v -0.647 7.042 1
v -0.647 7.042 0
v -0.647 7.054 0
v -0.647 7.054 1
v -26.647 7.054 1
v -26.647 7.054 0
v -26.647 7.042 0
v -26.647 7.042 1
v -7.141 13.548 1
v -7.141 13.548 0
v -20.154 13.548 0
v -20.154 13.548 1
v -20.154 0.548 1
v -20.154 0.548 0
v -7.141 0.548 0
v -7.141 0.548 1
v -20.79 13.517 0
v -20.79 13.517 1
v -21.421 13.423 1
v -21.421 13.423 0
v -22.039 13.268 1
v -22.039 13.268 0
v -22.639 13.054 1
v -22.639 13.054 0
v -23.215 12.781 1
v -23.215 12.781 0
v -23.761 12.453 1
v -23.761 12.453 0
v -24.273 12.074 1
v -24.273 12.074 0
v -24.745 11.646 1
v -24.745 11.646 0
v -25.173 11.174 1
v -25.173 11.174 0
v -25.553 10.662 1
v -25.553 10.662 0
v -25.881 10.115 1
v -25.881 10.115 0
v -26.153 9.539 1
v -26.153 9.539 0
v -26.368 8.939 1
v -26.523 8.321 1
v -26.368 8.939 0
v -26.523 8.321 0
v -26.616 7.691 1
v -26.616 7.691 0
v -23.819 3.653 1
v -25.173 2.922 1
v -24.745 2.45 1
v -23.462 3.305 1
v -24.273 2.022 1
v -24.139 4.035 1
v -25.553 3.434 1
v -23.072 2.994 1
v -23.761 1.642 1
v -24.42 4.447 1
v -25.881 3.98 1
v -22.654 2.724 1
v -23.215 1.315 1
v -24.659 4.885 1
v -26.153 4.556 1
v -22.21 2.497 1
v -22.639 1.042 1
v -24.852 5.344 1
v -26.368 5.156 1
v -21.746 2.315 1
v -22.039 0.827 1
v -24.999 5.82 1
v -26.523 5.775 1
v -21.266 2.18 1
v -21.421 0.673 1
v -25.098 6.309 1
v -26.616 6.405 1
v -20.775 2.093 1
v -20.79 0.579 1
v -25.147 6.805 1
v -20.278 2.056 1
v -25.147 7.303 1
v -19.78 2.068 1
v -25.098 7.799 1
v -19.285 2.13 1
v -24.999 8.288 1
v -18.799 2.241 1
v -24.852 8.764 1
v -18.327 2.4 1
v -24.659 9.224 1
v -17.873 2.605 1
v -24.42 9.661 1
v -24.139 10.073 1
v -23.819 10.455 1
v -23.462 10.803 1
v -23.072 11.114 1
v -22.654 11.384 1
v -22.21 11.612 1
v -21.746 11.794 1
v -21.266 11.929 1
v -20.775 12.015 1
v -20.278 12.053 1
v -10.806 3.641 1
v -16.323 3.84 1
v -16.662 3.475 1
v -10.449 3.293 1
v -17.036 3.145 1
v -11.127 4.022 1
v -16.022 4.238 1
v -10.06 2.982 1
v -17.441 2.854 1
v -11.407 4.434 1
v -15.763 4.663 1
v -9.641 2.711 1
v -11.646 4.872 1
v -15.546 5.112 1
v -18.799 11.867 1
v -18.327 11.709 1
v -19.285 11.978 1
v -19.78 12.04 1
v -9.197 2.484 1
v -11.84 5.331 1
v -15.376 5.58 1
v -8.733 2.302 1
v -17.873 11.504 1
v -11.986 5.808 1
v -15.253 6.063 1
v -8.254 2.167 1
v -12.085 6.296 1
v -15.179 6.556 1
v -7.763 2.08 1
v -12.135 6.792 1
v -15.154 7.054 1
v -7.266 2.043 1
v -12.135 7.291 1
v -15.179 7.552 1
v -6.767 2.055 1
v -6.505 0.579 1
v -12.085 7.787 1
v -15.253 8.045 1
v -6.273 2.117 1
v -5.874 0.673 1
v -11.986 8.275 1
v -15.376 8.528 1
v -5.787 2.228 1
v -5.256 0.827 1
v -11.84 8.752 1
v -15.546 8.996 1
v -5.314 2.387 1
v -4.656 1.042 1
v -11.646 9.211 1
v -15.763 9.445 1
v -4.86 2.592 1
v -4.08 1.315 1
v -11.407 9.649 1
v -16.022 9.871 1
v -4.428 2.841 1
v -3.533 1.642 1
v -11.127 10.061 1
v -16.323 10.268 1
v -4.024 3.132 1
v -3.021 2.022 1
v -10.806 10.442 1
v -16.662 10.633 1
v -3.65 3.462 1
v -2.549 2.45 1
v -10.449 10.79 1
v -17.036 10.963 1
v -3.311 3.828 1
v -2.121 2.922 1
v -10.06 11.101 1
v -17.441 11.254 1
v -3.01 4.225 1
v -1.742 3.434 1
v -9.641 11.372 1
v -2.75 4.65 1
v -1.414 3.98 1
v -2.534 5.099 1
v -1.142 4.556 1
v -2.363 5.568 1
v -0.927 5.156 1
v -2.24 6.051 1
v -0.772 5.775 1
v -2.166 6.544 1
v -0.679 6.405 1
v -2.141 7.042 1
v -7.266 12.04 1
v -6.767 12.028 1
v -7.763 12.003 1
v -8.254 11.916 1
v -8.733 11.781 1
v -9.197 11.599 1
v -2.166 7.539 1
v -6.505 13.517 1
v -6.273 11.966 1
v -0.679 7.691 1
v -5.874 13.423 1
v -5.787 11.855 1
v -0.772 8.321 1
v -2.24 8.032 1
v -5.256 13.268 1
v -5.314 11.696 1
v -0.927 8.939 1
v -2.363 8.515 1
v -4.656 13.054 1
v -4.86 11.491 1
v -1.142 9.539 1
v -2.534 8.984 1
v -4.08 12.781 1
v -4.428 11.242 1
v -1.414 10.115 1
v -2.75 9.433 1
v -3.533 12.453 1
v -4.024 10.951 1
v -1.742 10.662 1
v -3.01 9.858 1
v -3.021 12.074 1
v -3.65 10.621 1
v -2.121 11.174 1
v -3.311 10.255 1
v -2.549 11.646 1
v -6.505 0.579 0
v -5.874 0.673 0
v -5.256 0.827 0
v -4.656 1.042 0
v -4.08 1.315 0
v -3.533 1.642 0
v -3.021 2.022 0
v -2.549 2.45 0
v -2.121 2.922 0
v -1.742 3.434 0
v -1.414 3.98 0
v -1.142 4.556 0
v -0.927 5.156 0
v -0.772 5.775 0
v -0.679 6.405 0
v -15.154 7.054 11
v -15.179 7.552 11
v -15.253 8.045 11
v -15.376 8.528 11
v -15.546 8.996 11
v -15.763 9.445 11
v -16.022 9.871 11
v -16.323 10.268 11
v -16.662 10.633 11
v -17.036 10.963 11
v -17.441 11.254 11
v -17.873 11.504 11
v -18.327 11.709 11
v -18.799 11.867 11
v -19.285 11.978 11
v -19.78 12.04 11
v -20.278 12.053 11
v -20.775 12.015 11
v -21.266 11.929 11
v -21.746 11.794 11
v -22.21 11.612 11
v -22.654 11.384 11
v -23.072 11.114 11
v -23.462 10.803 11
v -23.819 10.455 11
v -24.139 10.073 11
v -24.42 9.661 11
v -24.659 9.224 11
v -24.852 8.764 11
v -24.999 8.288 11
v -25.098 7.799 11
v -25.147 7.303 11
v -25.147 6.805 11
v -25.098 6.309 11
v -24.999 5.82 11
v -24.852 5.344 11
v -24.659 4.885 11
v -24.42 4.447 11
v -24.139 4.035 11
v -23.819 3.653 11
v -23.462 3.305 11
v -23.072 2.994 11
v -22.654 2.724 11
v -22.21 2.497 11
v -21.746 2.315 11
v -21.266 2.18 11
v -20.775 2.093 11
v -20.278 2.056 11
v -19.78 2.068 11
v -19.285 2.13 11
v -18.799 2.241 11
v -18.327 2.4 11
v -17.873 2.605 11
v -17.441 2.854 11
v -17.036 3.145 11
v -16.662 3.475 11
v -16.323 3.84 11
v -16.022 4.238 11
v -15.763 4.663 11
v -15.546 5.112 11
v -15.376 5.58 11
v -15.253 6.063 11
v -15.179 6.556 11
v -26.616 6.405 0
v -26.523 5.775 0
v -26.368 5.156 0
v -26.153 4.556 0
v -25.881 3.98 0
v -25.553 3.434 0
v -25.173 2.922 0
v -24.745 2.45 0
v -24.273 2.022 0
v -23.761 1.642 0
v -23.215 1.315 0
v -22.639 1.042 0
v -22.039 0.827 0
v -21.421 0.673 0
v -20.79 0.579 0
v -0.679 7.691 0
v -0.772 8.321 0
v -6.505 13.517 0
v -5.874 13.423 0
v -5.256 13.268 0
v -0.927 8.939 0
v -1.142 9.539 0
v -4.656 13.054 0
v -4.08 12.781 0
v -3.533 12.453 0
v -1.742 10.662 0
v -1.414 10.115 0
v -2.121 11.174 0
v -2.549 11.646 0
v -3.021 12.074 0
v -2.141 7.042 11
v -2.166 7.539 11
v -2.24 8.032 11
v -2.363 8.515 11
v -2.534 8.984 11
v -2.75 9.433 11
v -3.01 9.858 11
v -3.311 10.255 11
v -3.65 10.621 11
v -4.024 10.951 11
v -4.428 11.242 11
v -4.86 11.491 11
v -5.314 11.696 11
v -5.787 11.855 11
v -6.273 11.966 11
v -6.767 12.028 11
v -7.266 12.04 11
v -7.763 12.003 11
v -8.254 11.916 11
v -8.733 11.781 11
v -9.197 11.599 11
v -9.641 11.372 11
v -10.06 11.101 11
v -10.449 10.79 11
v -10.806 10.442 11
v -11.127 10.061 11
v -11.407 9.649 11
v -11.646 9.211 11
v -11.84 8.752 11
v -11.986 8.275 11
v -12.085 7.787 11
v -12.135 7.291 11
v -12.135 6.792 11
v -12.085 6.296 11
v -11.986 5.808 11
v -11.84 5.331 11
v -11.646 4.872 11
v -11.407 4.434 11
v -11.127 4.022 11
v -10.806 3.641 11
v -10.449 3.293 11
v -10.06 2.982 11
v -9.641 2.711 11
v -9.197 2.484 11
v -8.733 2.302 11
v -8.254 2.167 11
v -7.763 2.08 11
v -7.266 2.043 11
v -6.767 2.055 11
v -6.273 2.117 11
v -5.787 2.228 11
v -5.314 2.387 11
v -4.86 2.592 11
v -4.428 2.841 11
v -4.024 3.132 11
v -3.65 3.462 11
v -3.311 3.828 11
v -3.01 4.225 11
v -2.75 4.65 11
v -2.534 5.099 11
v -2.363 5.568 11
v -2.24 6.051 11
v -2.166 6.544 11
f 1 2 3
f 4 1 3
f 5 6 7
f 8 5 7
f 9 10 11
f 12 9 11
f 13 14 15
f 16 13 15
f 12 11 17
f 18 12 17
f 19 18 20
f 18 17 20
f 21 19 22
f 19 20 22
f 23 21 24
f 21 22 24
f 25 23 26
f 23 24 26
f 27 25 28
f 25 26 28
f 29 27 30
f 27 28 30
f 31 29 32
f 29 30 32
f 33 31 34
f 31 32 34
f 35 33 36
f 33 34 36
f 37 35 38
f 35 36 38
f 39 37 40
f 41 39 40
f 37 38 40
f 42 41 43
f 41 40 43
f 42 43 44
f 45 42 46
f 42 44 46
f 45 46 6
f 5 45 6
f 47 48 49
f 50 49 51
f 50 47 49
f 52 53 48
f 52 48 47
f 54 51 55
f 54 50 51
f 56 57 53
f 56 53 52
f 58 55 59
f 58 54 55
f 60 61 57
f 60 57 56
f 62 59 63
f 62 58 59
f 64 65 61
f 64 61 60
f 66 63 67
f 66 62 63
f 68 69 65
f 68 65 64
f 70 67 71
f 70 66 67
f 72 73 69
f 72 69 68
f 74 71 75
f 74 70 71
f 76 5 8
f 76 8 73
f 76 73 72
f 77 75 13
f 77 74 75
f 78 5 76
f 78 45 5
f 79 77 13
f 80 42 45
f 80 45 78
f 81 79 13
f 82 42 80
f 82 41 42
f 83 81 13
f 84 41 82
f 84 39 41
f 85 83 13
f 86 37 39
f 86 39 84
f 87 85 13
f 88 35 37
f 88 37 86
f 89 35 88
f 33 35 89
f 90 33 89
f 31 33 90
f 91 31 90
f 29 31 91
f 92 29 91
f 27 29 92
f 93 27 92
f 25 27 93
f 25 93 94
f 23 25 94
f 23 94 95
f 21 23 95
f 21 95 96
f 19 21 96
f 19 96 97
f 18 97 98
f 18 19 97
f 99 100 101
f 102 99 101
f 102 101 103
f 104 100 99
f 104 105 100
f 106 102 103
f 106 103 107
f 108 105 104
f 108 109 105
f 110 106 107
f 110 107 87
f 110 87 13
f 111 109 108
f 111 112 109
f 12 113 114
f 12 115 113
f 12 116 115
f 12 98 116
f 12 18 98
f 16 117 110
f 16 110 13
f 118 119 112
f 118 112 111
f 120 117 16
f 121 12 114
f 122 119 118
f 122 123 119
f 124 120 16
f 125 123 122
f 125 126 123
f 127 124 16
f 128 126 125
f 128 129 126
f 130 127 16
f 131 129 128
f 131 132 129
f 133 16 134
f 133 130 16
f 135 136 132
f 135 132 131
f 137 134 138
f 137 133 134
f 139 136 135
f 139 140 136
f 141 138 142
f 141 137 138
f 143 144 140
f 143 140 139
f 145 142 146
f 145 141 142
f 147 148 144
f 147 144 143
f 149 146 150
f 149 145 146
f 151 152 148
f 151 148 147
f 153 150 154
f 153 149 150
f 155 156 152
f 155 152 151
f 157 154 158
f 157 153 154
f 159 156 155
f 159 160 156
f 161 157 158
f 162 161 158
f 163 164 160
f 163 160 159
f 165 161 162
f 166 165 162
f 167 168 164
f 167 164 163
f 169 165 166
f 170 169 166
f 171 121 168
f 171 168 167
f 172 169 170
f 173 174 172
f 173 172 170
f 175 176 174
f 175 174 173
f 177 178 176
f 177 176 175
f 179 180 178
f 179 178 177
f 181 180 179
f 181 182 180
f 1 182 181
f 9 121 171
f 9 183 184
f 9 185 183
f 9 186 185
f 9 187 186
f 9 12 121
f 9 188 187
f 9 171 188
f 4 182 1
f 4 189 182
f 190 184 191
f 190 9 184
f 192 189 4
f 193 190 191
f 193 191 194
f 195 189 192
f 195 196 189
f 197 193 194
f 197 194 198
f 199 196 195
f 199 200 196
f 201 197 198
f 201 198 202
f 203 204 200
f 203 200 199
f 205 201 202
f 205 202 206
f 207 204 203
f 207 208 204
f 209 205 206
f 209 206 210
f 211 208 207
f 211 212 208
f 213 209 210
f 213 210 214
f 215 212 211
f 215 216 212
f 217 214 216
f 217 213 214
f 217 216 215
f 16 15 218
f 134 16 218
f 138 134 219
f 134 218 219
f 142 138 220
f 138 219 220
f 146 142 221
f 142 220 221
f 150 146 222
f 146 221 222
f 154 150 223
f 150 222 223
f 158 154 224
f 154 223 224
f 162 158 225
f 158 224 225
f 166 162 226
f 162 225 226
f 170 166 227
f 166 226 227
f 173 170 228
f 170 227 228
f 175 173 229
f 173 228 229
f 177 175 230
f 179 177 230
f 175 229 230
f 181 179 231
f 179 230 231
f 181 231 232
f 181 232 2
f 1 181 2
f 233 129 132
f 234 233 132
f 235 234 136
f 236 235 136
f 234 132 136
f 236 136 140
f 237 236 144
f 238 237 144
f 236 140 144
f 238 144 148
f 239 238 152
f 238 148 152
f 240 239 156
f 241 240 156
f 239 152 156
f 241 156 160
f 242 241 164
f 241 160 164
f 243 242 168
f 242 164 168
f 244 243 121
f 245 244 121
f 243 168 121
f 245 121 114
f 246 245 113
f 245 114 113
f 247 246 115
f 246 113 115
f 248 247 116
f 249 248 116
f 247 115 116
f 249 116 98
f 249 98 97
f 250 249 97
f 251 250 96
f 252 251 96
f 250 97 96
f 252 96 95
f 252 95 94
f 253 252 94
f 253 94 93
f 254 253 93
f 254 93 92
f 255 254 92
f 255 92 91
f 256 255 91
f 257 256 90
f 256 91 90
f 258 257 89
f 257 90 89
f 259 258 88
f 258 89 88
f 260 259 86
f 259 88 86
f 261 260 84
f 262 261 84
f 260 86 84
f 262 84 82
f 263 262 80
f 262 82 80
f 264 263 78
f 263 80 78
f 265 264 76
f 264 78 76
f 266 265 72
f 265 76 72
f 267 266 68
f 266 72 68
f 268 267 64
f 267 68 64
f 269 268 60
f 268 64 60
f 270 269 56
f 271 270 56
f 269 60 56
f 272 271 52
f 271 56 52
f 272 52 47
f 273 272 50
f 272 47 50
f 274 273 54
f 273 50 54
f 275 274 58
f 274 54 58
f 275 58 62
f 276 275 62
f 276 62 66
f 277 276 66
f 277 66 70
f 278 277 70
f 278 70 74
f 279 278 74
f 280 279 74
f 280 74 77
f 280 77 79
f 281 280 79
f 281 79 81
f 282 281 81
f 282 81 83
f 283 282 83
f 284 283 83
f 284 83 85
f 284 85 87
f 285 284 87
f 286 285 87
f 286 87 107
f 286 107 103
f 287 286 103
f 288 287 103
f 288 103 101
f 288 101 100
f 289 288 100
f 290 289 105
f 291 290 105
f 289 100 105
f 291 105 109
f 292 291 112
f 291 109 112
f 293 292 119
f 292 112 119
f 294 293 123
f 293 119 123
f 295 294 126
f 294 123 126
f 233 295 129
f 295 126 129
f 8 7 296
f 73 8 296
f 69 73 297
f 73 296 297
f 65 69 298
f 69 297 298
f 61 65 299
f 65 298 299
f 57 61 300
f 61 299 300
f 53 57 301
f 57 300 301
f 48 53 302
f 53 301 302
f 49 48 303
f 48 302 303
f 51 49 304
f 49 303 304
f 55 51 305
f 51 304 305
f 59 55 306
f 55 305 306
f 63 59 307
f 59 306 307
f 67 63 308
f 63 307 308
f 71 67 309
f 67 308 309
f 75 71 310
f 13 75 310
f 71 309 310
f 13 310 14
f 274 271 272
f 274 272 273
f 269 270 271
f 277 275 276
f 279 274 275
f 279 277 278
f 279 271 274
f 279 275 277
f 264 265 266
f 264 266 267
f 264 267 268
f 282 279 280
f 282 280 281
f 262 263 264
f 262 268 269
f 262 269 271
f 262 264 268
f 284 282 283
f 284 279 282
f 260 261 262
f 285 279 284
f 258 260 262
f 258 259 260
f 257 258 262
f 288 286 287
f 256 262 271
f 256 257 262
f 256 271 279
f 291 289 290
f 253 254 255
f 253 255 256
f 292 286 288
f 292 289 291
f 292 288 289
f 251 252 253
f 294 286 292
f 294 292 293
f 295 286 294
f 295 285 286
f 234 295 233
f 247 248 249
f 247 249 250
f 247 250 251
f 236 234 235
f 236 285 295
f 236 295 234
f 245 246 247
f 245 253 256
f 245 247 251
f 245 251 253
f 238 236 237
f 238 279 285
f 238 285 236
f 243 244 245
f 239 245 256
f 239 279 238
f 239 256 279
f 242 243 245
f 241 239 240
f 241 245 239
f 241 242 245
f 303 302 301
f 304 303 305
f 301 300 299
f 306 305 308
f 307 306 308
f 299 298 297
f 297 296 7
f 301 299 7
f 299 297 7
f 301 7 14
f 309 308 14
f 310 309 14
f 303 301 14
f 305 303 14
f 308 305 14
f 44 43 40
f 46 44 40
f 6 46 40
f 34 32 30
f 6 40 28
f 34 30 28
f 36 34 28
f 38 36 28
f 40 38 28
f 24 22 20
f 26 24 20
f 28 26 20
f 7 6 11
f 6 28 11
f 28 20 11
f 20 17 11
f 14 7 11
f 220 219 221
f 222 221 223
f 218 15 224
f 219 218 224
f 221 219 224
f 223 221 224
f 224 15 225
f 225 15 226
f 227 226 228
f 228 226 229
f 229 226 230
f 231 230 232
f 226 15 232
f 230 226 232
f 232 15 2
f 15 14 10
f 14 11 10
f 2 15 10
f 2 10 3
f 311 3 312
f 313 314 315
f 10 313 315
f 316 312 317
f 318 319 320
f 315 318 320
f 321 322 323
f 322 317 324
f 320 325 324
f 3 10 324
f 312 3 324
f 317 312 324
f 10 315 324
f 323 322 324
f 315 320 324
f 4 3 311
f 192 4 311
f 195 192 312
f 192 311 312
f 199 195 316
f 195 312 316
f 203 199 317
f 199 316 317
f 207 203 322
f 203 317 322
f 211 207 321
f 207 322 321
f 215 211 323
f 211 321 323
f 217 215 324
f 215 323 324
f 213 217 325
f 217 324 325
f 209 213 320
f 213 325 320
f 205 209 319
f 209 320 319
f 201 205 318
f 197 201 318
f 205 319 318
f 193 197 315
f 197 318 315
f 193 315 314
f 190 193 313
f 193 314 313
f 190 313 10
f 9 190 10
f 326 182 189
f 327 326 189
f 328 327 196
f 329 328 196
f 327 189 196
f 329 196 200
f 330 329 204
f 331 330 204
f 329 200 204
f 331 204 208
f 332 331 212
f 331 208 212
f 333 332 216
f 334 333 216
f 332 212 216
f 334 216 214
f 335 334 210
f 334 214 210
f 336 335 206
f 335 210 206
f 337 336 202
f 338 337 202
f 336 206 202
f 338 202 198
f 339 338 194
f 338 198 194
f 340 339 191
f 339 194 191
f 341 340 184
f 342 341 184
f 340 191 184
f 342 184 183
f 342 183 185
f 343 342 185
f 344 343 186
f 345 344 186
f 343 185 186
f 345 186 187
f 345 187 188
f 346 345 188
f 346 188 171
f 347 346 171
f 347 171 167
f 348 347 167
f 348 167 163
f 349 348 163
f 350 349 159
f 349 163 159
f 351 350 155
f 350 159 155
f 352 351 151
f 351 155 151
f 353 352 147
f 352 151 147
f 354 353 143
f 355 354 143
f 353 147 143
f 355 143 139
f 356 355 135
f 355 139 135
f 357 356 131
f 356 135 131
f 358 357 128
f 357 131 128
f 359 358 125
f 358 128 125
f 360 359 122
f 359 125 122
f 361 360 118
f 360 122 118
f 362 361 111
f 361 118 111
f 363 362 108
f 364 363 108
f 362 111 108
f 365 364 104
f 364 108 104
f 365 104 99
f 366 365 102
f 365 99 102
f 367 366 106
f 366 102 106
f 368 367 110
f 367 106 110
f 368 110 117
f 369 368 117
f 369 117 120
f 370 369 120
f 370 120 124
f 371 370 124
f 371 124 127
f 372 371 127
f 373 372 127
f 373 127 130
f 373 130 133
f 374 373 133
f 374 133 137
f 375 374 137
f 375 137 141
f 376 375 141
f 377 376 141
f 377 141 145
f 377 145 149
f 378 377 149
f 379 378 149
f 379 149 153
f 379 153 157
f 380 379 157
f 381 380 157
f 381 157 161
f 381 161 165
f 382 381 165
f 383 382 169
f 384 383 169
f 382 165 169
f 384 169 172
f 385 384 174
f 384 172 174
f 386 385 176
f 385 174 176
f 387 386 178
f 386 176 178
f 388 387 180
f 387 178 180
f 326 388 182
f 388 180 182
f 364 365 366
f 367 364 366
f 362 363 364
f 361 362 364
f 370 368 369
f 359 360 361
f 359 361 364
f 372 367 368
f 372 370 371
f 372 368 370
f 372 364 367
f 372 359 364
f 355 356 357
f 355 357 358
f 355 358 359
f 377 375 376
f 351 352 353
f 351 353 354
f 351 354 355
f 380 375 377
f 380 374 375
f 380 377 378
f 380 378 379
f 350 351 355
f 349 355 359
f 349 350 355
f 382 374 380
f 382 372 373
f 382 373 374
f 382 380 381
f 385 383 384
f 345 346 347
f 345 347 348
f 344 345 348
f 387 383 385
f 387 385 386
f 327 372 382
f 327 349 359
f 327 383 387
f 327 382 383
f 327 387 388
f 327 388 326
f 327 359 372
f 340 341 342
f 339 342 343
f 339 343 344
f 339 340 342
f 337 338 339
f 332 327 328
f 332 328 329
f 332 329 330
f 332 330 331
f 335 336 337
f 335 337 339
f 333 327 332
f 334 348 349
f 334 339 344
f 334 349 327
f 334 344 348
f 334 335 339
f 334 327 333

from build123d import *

# Parameters (mm, degrees)
PAD_DEPTH    = 1
SKETCH002_R  = 5
PAD001_DEPTH = 10


with BuildPart() as part:
    # Sketch → Pad (new body)
    with BuildSketch(Plane.XY):
        with BuildLine():
            Line((-26.647359, 7.054149), (-26.647359, 7.041504))
            ThreePointArc((-26.647359, 7.041504), (-24.745405, 2.449781), (-20.153681, 0.547826))
            Line((-20.153681, 0.547826), (-7.141037, 0.547826))
            ThreePointArc((-7.141037, 0.547826), (-2.549313, 2.449781), (-0.647359, 7.041504))
            Line((-0.647359, 7.041504), (-0.647359, 7.054149))
            ThreePointArc((-0.647359, 7.054149), (-2.549313, 11.645872), (-7.141037, 13.547826))
            Line((-7.141037, 13.547826), (-20.153681, 13.547826))
            ThreePointArc((-20.153681, 13.547826), (-24.745405, 11.645872), (-26.647359, 7.054149))
        make_face()
    extrude(amount=PAD_DEPTH)

    # Sketch002 (on Face10 of Pad) → Pad001 (join)
    with BuildSketch(Plane.XY.offset(1)):
        with Locations((-20.153681, 7.054149)):
            Circle(SKETCH002_R)
        with Locations((-7.141037, 7.041504)):
            Circle(SKETCH002_R)
    extrude(amount=PAD001_DEPTH)


solid = part.part
